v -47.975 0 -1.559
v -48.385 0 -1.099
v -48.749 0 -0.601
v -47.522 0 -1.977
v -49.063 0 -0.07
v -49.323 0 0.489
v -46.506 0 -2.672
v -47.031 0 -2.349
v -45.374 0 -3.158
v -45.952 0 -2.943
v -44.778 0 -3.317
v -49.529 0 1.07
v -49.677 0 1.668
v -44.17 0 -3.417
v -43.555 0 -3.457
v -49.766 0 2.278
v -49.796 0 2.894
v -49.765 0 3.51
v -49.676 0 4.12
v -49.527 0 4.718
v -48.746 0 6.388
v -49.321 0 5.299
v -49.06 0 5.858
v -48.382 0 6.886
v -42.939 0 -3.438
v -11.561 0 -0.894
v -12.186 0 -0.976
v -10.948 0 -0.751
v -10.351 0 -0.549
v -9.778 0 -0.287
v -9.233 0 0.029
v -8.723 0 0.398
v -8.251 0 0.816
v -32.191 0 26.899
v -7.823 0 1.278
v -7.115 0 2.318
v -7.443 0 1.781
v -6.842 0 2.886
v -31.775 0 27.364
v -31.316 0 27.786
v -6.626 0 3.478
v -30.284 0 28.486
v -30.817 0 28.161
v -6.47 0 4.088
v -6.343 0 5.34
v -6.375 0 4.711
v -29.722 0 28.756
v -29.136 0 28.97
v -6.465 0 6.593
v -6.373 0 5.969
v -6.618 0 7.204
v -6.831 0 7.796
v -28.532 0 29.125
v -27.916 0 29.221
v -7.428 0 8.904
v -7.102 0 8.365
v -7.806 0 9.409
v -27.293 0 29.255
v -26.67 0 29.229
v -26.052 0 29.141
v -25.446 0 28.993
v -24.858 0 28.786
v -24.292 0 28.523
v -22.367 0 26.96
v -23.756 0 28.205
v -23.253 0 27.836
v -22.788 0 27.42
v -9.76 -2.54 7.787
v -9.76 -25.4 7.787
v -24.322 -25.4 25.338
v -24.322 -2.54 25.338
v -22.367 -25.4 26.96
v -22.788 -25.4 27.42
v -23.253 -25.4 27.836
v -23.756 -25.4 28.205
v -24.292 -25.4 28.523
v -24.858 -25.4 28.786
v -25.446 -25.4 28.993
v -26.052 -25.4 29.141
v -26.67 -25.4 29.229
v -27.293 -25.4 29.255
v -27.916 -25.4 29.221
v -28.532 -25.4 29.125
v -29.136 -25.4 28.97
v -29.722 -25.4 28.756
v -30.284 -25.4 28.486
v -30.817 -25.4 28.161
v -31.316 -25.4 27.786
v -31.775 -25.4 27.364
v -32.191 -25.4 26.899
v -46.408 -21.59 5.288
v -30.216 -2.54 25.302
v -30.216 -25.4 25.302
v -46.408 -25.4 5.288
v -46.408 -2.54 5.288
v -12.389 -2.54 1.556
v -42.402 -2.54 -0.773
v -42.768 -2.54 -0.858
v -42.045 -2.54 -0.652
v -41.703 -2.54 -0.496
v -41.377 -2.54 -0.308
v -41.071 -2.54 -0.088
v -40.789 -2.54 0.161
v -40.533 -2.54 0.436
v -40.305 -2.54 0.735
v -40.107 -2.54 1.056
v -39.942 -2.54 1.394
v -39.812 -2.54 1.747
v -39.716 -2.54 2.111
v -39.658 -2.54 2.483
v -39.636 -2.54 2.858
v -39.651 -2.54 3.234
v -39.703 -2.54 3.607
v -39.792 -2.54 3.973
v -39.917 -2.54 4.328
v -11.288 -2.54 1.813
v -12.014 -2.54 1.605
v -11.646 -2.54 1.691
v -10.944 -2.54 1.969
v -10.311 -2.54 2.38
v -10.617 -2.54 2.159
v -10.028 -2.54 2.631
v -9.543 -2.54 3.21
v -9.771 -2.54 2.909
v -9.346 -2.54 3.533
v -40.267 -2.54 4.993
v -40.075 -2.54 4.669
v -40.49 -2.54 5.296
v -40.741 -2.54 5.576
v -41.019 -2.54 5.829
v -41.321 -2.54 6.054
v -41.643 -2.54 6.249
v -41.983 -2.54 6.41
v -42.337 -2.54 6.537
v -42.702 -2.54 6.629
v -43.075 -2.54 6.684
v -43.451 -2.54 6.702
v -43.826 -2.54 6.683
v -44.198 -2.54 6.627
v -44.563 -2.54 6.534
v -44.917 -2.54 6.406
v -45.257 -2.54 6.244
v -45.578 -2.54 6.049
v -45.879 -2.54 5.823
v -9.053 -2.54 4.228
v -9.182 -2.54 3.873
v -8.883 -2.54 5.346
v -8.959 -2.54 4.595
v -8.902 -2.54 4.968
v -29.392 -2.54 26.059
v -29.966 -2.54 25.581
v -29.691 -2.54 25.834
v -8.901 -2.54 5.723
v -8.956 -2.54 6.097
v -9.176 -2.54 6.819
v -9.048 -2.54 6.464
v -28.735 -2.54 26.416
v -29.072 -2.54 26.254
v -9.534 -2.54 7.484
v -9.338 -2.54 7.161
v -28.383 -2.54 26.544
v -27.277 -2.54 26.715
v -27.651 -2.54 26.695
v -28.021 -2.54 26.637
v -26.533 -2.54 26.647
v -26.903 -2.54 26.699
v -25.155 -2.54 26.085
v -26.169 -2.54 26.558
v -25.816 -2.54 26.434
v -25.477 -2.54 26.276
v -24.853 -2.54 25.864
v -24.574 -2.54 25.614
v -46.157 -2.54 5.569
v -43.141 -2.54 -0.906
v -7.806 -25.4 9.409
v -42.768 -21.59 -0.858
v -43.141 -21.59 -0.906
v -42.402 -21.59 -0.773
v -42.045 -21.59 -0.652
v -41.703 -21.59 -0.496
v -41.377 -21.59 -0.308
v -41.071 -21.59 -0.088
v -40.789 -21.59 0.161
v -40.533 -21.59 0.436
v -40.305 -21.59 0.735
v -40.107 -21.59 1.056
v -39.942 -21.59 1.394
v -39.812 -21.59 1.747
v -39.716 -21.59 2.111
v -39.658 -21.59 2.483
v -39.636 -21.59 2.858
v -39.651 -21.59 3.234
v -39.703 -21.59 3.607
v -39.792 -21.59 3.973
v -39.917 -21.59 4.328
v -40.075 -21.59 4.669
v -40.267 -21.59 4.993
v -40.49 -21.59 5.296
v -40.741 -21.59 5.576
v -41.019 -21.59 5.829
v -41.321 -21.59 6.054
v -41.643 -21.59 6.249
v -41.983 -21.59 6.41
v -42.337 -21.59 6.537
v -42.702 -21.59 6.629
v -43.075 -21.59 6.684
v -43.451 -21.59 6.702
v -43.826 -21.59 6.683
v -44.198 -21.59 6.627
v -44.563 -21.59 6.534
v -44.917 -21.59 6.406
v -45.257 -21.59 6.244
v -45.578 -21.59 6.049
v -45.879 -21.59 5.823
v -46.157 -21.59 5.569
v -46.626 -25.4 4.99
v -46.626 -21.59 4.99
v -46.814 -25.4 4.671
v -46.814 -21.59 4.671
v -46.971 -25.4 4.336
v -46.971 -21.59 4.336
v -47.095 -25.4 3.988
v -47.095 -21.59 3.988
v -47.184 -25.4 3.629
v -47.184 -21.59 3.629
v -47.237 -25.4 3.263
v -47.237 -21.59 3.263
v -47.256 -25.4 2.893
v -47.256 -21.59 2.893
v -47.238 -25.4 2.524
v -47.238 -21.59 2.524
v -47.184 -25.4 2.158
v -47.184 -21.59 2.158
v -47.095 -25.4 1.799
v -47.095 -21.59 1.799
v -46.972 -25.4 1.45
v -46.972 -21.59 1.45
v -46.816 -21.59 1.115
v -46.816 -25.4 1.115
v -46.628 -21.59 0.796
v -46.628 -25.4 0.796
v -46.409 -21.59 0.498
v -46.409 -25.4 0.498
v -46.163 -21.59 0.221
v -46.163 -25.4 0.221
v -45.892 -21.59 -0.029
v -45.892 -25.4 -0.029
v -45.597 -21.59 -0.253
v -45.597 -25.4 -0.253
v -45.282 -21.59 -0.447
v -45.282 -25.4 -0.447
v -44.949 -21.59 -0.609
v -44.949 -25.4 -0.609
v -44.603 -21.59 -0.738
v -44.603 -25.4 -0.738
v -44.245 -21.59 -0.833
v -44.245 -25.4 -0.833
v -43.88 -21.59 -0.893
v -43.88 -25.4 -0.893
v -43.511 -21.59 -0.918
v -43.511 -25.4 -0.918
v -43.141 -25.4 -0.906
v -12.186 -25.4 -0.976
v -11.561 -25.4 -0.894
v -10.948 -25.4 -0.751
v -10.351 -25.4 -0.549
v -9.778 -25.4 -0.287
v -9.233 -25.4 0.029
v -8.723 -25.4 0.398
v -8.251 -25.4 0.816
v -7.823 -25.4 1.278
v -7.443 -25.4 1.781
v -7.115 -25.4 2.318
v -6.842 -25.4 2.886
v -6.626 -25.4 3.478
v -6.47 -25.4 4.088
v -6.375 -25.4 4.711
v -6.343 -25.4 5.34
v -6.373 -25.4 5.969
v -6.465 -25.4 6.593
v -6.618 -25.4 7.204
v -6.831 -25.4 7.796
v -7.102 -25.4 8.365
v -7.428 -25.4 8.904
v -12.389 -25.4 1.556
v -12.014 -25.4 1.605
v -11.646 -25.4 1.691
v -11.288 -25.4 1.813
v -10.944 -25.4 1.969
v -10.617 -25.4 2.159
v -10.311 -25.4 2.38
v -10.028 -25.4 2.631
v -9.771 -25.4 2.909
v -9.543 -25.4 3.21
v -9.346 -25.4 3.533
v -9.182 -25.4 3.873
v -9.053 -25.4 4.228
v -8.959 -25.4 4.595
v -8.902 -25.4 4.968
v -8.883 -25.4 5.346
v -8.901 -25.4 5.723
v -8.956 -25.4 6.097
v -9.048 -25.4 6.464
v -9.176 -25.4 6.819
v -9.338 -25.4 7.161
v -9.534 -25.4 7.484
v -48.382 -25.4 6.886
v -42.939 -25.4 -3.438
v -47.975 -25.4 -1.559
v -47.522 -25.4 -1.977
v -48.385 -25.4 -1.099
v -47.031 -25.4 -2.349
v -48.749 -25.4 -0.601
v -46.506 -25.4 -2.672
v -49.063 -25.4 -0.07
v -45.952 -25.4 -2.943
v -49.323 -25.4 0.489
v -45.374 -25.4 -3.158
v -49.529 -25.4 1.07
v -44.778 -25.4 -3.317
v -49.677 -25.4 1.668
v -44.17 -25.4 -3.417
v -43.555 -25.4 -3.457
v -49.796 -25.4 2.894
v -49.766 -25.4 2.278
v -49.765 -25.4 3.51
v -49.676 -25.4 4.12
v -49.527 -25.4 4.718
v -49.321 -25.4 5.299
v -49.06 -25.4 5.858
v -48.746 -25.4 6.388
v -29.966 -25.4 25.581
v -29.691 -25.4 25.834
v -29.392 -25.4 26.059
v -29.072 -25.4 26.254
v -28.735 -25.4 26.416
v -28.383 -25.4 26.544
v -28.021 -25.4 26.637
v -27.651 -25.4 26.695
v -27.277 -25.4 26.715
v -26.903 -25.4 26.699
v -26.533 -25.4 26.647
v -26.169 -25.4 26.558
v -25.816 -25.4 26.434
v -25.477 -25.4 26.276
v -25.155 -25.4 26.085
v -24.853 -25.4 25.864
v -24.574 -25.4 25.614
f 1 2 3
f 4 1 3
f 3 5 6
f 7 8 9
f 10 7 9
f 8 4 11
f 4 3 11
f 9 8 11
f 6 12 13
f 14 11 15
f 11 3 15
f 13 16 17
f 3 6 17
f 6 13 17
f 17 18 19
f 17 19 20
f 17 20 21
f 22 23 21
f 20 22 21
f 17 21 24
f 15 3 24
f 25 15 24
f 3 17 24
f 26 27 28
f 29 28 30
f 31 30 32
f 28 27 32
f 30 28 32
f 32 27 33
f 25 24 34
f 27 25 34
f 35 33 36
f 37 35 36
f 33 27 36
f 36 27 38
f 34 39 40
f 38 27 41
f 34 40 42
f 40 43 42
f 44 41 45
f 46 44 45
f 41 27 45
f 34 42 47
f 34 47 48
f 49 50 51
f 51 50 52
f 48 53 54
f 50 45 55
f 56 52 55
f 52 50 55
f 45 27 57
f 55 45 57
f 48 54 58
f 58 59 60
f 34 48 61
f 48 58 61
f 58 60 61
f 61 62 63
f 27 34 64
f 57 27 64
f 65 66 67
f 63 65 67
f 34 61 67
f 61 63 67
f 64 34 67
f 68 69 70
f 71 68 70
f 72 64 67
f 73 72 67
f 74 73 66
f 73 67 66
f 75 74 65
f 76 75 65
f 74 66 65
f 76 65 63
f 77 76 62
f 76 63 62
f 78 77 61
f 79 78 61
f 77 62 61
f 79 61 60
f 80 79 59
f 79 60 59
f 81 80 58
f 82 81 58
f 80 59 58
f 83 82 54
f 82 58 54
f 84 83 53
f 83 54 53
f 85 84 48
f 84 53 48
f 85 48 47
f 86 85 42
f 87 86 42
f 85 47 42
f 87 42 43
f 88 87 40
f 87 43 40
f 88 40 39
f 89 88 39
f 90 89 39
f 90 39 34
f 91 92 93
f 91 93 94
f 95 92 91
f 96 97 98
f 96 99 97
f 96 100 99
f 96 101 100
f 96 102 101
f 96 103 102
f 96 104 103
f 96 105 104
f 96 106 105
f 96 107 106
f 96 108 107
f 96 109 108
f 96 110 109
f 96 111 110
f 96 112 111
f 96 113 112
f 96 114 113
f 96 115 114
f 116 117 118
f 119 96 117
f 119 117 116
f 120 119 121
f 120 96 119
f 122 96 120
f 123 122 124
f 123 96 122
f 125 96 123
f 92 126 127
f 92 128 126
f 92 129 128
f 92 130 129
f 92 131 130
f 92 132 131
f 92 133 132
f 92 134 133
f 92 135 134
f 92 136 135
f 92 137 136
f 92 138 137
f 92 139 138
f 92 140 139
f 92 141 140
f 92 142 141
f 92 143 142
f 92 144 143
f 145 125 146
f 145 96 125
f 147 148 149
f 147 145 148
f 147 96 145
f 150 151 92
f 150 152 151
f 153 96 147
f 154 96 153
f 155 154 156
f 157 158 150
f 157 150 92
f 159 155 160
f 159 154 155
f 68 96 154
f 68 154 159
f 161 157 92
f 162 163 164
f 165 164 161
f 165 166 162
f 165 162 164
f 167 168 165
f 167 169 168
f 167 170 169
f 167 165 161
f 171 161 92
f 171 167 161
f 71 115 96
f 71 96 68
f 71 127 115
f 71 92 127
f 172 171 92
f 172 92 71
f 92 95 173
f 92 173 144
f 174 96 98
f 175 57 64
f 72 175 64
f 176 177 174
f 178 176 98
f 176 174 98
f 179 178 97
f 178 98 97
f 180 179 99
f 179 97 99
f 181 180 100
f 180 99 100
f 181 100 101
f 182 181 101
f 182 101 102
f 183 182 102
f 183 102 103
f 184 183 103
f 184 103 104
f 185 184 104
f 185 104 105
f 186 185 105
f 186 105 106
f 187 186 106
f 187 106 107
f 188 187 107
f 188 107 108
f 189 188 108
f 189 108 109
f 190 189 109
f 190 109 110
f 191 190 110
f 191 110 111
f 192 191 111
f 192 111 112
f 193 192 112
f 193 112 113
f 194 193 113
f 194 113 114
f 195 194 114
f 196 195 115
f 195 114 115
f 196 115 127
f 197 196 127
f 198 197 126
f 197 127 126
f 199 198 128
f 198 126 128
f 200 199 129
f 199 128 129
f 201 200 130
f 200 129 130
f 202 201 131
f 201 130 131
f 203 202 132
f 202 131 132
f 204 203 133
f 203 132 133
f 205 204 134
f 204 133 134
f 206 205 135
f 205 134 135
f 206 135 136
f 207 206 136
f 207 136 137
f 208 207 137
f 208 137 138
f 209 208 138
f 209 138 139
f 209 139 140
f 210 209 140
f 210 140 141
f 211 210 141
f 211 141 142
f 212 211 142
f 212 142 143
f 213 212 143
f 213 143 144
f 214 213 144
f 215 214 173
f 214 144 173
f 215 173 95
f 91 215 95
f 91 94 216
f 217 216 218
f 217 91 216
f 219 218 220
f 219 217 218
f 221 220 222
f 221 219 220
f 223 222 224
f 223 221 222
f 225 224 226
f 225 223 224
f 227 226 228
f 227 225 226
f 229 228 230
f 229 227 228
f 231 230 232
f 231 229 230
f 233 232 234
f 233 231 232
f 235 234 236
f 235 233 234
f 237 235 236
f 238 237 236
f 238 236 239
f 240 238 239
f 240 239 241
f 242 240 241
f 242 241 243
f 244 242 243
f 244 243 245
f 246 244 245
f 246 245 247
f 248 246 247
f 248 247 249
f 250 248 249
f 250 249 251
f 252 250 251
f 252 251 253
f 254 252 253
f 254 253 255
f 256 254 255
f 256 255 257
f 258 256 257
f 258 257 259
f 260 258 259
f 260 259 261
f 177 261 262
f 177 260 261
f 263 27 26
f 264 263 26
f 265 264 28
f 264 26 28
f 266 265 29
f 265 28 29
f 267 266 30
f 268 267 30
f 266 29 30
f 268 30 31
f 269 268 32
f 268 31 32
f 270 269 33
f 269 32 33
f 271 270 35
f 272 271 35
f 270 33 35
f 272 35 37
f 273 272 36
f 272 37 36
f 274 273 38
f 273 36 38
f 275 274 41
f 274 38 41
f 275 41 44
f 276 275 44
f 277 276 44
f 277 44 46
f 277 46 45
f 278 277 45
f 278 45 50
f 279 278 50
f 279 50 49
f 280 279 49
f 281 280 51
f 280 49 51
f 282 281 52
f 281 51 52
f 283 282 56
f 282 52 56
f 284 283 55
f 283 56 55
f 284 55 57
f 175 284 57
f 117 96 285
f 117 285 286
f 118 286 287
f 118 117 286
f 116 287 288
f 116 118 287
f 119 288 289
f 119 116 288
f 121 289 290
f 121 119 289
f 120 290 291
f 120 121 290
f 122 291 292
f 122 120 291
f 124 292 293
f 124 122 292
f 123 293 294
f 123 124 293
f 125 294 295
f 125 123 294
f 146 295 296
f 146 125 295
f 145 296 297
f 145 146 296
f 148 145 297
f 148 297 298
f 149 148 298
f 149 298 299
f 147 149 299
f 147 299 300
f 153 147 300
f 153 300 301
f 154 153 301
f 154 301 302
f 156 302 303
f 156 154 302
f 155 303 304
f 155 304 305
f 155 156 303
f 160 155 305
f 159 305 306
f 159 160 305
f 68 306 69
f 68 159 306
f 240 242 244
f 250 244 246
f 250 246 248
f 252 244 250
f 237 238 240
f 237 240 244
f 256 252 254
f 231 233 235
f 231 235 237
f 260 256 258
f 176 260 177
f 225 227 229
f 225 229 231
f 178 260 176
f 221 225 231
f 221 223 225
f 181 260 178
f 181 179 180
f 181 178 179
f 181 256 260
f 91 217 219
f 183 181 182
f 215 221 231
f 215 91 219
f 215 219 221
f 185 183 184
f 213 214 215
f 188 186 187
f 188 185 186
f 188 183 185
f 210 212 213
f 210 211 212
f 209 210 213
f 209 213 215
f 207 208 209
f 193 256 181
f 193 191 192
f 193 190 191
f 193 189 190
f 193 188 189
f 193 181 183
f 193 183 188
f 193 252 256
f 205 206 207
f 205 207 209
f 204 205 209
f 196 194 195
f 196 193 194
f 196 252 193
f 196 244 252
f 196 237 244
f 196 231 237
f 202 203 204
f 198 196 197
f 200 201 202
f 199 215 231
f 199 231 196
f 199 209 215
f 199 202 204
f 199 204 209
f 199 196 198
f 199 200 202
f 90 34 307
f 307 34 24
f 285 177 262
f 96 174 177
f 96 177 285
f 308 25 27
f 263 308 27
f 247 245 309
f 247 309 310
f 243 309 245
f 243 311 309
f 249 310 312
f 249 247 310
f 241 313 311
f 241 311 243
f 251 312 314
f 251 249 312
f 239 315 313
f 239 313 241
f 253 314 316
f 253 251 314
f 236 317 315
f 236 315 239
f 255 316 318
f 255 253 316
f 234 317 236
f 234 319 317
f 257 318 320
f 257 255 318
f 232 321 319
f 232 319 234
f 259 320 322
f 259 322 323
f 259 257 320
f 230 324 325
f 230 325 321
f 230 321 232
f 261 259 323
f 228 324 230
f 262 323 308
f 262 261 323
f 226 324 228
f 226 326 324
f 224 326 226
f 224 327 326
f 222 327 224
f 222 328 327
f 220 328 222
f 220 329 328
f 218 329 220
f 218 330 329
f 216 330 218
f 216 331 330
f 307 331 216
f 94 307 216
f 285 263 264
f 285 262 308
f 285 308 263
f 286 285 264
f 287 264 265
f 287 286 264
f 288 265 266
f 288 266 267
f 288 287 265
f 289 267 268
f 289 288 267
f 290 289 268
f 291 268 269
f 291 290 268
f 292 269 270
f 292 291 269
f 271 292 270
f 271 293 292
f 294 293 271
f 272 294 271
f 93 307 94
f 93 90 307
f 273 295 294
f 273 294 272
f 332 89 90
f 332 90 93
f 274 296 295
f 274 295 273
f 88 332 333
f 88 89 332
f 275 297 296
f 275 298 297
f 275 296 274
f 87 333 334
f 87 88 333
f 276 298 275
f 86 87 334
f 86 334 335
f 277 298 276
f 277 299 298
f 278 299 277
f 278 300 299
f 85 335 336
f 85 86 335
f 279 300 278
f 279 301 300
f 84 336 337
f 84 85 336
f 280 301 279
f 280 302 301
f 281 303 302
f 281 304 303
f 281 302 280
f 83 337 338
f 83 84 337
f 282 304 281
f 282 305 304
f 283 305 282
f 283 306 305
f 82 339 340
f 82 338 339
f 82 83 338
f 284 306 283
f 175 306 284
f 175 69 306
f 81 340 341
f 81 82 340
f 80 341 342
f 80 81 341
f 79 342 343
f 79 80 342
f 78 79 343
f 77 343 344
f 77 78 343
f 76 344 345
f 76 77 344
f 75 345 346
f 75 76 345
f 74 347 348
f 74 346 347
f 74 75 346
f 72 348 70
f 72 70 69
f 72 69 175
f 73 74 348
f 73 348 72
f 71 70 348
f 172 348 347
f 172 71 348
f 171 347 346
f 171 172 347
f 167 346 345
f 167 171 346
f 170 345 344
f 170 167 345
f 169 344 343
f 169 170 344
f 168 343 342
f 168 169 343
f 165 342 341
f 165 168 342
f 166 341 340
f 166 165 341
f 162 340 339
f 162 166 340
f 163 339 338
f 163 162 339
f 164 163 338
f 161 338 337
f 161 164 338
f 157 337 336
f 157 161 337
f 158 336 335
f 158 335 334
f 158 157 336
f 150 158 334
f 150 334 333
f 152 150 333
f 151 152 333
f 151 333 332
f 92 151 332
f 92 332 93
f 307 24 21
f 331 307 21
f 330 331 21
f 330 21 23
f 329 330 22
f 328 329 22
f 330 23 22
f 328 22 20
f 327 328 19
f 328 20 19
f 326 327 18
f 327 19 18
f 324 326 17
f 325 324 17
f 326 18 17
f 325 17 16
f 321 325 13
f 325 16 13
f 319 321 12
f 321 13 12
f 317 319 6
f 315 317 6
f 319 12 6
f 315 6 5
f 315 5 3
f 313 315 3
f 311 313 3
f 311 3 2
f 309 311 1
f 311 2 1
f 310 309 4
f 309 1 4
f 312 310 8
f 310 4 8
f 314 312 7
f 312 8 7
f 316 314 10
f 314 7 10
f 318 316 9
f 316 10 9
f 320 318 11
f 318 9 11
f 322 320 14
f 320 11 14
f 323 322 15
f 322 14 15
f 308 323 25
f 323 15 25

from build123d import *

# Parameters (mm, degrees)
F1_DEPTH = 25.4
F2_T     = -2.54
F3_R     = 3.81
F4_DEPTH = 19.05


# Not quite as in the source:
# - the program builds the solid bodies; features that only make, move or delete a surface that nothing else refers to are left out


with BuildPart() as f1:
    # F0 (on Front) → F1 (new body)
    with BuildSketch(Plane.XZ):
        with BuildLine():
            ThreePointArc((-12.1858643886, -0.9756983319), (-6.8419002324, 2.8860613911), (-7.8055765775, 9.4085202038))
            Line((-7.8055765775, 9.4085202038), (-22.3667159803, 26.9599173237))
            ThreePointArc((-22.3667159803, 26.9599173237), (-27.2929398052, 29.2553210157), (-32.1905035986, 26.8993863451))
            Line((-32.1905035986, 26.8993863451), (-48.3822646253, 6.8856646257))
            ThreePointArc((-48.3822646253, 6.8856646257), (-49.0625660789, -0.0700213051), (-42.9387648181, -3.4380229313))
            Line((-42.9387648181, -3.4380229313), (-12.1858643886, -0.9756983319))
        make_face()
    extrude(amount=F1_DEPTH)

    # F2
    f2_openings = [f1.faces().sort_by_distance(p)[0] for p in [
        (-28.02144, -25.4, 9.948419),
    ]]
    offset(amount=F2_T, openings=f2_openings)

    # F3 (on face) → F4 (join)
    with BuildSketch(Plane.XZ.offset(2.54)):
        with Locations((-43.4455749435, 2.8917198357)):
            Circle(F3_R)
    extrude(amount=F4_DEPTH)


solid = f1.part
